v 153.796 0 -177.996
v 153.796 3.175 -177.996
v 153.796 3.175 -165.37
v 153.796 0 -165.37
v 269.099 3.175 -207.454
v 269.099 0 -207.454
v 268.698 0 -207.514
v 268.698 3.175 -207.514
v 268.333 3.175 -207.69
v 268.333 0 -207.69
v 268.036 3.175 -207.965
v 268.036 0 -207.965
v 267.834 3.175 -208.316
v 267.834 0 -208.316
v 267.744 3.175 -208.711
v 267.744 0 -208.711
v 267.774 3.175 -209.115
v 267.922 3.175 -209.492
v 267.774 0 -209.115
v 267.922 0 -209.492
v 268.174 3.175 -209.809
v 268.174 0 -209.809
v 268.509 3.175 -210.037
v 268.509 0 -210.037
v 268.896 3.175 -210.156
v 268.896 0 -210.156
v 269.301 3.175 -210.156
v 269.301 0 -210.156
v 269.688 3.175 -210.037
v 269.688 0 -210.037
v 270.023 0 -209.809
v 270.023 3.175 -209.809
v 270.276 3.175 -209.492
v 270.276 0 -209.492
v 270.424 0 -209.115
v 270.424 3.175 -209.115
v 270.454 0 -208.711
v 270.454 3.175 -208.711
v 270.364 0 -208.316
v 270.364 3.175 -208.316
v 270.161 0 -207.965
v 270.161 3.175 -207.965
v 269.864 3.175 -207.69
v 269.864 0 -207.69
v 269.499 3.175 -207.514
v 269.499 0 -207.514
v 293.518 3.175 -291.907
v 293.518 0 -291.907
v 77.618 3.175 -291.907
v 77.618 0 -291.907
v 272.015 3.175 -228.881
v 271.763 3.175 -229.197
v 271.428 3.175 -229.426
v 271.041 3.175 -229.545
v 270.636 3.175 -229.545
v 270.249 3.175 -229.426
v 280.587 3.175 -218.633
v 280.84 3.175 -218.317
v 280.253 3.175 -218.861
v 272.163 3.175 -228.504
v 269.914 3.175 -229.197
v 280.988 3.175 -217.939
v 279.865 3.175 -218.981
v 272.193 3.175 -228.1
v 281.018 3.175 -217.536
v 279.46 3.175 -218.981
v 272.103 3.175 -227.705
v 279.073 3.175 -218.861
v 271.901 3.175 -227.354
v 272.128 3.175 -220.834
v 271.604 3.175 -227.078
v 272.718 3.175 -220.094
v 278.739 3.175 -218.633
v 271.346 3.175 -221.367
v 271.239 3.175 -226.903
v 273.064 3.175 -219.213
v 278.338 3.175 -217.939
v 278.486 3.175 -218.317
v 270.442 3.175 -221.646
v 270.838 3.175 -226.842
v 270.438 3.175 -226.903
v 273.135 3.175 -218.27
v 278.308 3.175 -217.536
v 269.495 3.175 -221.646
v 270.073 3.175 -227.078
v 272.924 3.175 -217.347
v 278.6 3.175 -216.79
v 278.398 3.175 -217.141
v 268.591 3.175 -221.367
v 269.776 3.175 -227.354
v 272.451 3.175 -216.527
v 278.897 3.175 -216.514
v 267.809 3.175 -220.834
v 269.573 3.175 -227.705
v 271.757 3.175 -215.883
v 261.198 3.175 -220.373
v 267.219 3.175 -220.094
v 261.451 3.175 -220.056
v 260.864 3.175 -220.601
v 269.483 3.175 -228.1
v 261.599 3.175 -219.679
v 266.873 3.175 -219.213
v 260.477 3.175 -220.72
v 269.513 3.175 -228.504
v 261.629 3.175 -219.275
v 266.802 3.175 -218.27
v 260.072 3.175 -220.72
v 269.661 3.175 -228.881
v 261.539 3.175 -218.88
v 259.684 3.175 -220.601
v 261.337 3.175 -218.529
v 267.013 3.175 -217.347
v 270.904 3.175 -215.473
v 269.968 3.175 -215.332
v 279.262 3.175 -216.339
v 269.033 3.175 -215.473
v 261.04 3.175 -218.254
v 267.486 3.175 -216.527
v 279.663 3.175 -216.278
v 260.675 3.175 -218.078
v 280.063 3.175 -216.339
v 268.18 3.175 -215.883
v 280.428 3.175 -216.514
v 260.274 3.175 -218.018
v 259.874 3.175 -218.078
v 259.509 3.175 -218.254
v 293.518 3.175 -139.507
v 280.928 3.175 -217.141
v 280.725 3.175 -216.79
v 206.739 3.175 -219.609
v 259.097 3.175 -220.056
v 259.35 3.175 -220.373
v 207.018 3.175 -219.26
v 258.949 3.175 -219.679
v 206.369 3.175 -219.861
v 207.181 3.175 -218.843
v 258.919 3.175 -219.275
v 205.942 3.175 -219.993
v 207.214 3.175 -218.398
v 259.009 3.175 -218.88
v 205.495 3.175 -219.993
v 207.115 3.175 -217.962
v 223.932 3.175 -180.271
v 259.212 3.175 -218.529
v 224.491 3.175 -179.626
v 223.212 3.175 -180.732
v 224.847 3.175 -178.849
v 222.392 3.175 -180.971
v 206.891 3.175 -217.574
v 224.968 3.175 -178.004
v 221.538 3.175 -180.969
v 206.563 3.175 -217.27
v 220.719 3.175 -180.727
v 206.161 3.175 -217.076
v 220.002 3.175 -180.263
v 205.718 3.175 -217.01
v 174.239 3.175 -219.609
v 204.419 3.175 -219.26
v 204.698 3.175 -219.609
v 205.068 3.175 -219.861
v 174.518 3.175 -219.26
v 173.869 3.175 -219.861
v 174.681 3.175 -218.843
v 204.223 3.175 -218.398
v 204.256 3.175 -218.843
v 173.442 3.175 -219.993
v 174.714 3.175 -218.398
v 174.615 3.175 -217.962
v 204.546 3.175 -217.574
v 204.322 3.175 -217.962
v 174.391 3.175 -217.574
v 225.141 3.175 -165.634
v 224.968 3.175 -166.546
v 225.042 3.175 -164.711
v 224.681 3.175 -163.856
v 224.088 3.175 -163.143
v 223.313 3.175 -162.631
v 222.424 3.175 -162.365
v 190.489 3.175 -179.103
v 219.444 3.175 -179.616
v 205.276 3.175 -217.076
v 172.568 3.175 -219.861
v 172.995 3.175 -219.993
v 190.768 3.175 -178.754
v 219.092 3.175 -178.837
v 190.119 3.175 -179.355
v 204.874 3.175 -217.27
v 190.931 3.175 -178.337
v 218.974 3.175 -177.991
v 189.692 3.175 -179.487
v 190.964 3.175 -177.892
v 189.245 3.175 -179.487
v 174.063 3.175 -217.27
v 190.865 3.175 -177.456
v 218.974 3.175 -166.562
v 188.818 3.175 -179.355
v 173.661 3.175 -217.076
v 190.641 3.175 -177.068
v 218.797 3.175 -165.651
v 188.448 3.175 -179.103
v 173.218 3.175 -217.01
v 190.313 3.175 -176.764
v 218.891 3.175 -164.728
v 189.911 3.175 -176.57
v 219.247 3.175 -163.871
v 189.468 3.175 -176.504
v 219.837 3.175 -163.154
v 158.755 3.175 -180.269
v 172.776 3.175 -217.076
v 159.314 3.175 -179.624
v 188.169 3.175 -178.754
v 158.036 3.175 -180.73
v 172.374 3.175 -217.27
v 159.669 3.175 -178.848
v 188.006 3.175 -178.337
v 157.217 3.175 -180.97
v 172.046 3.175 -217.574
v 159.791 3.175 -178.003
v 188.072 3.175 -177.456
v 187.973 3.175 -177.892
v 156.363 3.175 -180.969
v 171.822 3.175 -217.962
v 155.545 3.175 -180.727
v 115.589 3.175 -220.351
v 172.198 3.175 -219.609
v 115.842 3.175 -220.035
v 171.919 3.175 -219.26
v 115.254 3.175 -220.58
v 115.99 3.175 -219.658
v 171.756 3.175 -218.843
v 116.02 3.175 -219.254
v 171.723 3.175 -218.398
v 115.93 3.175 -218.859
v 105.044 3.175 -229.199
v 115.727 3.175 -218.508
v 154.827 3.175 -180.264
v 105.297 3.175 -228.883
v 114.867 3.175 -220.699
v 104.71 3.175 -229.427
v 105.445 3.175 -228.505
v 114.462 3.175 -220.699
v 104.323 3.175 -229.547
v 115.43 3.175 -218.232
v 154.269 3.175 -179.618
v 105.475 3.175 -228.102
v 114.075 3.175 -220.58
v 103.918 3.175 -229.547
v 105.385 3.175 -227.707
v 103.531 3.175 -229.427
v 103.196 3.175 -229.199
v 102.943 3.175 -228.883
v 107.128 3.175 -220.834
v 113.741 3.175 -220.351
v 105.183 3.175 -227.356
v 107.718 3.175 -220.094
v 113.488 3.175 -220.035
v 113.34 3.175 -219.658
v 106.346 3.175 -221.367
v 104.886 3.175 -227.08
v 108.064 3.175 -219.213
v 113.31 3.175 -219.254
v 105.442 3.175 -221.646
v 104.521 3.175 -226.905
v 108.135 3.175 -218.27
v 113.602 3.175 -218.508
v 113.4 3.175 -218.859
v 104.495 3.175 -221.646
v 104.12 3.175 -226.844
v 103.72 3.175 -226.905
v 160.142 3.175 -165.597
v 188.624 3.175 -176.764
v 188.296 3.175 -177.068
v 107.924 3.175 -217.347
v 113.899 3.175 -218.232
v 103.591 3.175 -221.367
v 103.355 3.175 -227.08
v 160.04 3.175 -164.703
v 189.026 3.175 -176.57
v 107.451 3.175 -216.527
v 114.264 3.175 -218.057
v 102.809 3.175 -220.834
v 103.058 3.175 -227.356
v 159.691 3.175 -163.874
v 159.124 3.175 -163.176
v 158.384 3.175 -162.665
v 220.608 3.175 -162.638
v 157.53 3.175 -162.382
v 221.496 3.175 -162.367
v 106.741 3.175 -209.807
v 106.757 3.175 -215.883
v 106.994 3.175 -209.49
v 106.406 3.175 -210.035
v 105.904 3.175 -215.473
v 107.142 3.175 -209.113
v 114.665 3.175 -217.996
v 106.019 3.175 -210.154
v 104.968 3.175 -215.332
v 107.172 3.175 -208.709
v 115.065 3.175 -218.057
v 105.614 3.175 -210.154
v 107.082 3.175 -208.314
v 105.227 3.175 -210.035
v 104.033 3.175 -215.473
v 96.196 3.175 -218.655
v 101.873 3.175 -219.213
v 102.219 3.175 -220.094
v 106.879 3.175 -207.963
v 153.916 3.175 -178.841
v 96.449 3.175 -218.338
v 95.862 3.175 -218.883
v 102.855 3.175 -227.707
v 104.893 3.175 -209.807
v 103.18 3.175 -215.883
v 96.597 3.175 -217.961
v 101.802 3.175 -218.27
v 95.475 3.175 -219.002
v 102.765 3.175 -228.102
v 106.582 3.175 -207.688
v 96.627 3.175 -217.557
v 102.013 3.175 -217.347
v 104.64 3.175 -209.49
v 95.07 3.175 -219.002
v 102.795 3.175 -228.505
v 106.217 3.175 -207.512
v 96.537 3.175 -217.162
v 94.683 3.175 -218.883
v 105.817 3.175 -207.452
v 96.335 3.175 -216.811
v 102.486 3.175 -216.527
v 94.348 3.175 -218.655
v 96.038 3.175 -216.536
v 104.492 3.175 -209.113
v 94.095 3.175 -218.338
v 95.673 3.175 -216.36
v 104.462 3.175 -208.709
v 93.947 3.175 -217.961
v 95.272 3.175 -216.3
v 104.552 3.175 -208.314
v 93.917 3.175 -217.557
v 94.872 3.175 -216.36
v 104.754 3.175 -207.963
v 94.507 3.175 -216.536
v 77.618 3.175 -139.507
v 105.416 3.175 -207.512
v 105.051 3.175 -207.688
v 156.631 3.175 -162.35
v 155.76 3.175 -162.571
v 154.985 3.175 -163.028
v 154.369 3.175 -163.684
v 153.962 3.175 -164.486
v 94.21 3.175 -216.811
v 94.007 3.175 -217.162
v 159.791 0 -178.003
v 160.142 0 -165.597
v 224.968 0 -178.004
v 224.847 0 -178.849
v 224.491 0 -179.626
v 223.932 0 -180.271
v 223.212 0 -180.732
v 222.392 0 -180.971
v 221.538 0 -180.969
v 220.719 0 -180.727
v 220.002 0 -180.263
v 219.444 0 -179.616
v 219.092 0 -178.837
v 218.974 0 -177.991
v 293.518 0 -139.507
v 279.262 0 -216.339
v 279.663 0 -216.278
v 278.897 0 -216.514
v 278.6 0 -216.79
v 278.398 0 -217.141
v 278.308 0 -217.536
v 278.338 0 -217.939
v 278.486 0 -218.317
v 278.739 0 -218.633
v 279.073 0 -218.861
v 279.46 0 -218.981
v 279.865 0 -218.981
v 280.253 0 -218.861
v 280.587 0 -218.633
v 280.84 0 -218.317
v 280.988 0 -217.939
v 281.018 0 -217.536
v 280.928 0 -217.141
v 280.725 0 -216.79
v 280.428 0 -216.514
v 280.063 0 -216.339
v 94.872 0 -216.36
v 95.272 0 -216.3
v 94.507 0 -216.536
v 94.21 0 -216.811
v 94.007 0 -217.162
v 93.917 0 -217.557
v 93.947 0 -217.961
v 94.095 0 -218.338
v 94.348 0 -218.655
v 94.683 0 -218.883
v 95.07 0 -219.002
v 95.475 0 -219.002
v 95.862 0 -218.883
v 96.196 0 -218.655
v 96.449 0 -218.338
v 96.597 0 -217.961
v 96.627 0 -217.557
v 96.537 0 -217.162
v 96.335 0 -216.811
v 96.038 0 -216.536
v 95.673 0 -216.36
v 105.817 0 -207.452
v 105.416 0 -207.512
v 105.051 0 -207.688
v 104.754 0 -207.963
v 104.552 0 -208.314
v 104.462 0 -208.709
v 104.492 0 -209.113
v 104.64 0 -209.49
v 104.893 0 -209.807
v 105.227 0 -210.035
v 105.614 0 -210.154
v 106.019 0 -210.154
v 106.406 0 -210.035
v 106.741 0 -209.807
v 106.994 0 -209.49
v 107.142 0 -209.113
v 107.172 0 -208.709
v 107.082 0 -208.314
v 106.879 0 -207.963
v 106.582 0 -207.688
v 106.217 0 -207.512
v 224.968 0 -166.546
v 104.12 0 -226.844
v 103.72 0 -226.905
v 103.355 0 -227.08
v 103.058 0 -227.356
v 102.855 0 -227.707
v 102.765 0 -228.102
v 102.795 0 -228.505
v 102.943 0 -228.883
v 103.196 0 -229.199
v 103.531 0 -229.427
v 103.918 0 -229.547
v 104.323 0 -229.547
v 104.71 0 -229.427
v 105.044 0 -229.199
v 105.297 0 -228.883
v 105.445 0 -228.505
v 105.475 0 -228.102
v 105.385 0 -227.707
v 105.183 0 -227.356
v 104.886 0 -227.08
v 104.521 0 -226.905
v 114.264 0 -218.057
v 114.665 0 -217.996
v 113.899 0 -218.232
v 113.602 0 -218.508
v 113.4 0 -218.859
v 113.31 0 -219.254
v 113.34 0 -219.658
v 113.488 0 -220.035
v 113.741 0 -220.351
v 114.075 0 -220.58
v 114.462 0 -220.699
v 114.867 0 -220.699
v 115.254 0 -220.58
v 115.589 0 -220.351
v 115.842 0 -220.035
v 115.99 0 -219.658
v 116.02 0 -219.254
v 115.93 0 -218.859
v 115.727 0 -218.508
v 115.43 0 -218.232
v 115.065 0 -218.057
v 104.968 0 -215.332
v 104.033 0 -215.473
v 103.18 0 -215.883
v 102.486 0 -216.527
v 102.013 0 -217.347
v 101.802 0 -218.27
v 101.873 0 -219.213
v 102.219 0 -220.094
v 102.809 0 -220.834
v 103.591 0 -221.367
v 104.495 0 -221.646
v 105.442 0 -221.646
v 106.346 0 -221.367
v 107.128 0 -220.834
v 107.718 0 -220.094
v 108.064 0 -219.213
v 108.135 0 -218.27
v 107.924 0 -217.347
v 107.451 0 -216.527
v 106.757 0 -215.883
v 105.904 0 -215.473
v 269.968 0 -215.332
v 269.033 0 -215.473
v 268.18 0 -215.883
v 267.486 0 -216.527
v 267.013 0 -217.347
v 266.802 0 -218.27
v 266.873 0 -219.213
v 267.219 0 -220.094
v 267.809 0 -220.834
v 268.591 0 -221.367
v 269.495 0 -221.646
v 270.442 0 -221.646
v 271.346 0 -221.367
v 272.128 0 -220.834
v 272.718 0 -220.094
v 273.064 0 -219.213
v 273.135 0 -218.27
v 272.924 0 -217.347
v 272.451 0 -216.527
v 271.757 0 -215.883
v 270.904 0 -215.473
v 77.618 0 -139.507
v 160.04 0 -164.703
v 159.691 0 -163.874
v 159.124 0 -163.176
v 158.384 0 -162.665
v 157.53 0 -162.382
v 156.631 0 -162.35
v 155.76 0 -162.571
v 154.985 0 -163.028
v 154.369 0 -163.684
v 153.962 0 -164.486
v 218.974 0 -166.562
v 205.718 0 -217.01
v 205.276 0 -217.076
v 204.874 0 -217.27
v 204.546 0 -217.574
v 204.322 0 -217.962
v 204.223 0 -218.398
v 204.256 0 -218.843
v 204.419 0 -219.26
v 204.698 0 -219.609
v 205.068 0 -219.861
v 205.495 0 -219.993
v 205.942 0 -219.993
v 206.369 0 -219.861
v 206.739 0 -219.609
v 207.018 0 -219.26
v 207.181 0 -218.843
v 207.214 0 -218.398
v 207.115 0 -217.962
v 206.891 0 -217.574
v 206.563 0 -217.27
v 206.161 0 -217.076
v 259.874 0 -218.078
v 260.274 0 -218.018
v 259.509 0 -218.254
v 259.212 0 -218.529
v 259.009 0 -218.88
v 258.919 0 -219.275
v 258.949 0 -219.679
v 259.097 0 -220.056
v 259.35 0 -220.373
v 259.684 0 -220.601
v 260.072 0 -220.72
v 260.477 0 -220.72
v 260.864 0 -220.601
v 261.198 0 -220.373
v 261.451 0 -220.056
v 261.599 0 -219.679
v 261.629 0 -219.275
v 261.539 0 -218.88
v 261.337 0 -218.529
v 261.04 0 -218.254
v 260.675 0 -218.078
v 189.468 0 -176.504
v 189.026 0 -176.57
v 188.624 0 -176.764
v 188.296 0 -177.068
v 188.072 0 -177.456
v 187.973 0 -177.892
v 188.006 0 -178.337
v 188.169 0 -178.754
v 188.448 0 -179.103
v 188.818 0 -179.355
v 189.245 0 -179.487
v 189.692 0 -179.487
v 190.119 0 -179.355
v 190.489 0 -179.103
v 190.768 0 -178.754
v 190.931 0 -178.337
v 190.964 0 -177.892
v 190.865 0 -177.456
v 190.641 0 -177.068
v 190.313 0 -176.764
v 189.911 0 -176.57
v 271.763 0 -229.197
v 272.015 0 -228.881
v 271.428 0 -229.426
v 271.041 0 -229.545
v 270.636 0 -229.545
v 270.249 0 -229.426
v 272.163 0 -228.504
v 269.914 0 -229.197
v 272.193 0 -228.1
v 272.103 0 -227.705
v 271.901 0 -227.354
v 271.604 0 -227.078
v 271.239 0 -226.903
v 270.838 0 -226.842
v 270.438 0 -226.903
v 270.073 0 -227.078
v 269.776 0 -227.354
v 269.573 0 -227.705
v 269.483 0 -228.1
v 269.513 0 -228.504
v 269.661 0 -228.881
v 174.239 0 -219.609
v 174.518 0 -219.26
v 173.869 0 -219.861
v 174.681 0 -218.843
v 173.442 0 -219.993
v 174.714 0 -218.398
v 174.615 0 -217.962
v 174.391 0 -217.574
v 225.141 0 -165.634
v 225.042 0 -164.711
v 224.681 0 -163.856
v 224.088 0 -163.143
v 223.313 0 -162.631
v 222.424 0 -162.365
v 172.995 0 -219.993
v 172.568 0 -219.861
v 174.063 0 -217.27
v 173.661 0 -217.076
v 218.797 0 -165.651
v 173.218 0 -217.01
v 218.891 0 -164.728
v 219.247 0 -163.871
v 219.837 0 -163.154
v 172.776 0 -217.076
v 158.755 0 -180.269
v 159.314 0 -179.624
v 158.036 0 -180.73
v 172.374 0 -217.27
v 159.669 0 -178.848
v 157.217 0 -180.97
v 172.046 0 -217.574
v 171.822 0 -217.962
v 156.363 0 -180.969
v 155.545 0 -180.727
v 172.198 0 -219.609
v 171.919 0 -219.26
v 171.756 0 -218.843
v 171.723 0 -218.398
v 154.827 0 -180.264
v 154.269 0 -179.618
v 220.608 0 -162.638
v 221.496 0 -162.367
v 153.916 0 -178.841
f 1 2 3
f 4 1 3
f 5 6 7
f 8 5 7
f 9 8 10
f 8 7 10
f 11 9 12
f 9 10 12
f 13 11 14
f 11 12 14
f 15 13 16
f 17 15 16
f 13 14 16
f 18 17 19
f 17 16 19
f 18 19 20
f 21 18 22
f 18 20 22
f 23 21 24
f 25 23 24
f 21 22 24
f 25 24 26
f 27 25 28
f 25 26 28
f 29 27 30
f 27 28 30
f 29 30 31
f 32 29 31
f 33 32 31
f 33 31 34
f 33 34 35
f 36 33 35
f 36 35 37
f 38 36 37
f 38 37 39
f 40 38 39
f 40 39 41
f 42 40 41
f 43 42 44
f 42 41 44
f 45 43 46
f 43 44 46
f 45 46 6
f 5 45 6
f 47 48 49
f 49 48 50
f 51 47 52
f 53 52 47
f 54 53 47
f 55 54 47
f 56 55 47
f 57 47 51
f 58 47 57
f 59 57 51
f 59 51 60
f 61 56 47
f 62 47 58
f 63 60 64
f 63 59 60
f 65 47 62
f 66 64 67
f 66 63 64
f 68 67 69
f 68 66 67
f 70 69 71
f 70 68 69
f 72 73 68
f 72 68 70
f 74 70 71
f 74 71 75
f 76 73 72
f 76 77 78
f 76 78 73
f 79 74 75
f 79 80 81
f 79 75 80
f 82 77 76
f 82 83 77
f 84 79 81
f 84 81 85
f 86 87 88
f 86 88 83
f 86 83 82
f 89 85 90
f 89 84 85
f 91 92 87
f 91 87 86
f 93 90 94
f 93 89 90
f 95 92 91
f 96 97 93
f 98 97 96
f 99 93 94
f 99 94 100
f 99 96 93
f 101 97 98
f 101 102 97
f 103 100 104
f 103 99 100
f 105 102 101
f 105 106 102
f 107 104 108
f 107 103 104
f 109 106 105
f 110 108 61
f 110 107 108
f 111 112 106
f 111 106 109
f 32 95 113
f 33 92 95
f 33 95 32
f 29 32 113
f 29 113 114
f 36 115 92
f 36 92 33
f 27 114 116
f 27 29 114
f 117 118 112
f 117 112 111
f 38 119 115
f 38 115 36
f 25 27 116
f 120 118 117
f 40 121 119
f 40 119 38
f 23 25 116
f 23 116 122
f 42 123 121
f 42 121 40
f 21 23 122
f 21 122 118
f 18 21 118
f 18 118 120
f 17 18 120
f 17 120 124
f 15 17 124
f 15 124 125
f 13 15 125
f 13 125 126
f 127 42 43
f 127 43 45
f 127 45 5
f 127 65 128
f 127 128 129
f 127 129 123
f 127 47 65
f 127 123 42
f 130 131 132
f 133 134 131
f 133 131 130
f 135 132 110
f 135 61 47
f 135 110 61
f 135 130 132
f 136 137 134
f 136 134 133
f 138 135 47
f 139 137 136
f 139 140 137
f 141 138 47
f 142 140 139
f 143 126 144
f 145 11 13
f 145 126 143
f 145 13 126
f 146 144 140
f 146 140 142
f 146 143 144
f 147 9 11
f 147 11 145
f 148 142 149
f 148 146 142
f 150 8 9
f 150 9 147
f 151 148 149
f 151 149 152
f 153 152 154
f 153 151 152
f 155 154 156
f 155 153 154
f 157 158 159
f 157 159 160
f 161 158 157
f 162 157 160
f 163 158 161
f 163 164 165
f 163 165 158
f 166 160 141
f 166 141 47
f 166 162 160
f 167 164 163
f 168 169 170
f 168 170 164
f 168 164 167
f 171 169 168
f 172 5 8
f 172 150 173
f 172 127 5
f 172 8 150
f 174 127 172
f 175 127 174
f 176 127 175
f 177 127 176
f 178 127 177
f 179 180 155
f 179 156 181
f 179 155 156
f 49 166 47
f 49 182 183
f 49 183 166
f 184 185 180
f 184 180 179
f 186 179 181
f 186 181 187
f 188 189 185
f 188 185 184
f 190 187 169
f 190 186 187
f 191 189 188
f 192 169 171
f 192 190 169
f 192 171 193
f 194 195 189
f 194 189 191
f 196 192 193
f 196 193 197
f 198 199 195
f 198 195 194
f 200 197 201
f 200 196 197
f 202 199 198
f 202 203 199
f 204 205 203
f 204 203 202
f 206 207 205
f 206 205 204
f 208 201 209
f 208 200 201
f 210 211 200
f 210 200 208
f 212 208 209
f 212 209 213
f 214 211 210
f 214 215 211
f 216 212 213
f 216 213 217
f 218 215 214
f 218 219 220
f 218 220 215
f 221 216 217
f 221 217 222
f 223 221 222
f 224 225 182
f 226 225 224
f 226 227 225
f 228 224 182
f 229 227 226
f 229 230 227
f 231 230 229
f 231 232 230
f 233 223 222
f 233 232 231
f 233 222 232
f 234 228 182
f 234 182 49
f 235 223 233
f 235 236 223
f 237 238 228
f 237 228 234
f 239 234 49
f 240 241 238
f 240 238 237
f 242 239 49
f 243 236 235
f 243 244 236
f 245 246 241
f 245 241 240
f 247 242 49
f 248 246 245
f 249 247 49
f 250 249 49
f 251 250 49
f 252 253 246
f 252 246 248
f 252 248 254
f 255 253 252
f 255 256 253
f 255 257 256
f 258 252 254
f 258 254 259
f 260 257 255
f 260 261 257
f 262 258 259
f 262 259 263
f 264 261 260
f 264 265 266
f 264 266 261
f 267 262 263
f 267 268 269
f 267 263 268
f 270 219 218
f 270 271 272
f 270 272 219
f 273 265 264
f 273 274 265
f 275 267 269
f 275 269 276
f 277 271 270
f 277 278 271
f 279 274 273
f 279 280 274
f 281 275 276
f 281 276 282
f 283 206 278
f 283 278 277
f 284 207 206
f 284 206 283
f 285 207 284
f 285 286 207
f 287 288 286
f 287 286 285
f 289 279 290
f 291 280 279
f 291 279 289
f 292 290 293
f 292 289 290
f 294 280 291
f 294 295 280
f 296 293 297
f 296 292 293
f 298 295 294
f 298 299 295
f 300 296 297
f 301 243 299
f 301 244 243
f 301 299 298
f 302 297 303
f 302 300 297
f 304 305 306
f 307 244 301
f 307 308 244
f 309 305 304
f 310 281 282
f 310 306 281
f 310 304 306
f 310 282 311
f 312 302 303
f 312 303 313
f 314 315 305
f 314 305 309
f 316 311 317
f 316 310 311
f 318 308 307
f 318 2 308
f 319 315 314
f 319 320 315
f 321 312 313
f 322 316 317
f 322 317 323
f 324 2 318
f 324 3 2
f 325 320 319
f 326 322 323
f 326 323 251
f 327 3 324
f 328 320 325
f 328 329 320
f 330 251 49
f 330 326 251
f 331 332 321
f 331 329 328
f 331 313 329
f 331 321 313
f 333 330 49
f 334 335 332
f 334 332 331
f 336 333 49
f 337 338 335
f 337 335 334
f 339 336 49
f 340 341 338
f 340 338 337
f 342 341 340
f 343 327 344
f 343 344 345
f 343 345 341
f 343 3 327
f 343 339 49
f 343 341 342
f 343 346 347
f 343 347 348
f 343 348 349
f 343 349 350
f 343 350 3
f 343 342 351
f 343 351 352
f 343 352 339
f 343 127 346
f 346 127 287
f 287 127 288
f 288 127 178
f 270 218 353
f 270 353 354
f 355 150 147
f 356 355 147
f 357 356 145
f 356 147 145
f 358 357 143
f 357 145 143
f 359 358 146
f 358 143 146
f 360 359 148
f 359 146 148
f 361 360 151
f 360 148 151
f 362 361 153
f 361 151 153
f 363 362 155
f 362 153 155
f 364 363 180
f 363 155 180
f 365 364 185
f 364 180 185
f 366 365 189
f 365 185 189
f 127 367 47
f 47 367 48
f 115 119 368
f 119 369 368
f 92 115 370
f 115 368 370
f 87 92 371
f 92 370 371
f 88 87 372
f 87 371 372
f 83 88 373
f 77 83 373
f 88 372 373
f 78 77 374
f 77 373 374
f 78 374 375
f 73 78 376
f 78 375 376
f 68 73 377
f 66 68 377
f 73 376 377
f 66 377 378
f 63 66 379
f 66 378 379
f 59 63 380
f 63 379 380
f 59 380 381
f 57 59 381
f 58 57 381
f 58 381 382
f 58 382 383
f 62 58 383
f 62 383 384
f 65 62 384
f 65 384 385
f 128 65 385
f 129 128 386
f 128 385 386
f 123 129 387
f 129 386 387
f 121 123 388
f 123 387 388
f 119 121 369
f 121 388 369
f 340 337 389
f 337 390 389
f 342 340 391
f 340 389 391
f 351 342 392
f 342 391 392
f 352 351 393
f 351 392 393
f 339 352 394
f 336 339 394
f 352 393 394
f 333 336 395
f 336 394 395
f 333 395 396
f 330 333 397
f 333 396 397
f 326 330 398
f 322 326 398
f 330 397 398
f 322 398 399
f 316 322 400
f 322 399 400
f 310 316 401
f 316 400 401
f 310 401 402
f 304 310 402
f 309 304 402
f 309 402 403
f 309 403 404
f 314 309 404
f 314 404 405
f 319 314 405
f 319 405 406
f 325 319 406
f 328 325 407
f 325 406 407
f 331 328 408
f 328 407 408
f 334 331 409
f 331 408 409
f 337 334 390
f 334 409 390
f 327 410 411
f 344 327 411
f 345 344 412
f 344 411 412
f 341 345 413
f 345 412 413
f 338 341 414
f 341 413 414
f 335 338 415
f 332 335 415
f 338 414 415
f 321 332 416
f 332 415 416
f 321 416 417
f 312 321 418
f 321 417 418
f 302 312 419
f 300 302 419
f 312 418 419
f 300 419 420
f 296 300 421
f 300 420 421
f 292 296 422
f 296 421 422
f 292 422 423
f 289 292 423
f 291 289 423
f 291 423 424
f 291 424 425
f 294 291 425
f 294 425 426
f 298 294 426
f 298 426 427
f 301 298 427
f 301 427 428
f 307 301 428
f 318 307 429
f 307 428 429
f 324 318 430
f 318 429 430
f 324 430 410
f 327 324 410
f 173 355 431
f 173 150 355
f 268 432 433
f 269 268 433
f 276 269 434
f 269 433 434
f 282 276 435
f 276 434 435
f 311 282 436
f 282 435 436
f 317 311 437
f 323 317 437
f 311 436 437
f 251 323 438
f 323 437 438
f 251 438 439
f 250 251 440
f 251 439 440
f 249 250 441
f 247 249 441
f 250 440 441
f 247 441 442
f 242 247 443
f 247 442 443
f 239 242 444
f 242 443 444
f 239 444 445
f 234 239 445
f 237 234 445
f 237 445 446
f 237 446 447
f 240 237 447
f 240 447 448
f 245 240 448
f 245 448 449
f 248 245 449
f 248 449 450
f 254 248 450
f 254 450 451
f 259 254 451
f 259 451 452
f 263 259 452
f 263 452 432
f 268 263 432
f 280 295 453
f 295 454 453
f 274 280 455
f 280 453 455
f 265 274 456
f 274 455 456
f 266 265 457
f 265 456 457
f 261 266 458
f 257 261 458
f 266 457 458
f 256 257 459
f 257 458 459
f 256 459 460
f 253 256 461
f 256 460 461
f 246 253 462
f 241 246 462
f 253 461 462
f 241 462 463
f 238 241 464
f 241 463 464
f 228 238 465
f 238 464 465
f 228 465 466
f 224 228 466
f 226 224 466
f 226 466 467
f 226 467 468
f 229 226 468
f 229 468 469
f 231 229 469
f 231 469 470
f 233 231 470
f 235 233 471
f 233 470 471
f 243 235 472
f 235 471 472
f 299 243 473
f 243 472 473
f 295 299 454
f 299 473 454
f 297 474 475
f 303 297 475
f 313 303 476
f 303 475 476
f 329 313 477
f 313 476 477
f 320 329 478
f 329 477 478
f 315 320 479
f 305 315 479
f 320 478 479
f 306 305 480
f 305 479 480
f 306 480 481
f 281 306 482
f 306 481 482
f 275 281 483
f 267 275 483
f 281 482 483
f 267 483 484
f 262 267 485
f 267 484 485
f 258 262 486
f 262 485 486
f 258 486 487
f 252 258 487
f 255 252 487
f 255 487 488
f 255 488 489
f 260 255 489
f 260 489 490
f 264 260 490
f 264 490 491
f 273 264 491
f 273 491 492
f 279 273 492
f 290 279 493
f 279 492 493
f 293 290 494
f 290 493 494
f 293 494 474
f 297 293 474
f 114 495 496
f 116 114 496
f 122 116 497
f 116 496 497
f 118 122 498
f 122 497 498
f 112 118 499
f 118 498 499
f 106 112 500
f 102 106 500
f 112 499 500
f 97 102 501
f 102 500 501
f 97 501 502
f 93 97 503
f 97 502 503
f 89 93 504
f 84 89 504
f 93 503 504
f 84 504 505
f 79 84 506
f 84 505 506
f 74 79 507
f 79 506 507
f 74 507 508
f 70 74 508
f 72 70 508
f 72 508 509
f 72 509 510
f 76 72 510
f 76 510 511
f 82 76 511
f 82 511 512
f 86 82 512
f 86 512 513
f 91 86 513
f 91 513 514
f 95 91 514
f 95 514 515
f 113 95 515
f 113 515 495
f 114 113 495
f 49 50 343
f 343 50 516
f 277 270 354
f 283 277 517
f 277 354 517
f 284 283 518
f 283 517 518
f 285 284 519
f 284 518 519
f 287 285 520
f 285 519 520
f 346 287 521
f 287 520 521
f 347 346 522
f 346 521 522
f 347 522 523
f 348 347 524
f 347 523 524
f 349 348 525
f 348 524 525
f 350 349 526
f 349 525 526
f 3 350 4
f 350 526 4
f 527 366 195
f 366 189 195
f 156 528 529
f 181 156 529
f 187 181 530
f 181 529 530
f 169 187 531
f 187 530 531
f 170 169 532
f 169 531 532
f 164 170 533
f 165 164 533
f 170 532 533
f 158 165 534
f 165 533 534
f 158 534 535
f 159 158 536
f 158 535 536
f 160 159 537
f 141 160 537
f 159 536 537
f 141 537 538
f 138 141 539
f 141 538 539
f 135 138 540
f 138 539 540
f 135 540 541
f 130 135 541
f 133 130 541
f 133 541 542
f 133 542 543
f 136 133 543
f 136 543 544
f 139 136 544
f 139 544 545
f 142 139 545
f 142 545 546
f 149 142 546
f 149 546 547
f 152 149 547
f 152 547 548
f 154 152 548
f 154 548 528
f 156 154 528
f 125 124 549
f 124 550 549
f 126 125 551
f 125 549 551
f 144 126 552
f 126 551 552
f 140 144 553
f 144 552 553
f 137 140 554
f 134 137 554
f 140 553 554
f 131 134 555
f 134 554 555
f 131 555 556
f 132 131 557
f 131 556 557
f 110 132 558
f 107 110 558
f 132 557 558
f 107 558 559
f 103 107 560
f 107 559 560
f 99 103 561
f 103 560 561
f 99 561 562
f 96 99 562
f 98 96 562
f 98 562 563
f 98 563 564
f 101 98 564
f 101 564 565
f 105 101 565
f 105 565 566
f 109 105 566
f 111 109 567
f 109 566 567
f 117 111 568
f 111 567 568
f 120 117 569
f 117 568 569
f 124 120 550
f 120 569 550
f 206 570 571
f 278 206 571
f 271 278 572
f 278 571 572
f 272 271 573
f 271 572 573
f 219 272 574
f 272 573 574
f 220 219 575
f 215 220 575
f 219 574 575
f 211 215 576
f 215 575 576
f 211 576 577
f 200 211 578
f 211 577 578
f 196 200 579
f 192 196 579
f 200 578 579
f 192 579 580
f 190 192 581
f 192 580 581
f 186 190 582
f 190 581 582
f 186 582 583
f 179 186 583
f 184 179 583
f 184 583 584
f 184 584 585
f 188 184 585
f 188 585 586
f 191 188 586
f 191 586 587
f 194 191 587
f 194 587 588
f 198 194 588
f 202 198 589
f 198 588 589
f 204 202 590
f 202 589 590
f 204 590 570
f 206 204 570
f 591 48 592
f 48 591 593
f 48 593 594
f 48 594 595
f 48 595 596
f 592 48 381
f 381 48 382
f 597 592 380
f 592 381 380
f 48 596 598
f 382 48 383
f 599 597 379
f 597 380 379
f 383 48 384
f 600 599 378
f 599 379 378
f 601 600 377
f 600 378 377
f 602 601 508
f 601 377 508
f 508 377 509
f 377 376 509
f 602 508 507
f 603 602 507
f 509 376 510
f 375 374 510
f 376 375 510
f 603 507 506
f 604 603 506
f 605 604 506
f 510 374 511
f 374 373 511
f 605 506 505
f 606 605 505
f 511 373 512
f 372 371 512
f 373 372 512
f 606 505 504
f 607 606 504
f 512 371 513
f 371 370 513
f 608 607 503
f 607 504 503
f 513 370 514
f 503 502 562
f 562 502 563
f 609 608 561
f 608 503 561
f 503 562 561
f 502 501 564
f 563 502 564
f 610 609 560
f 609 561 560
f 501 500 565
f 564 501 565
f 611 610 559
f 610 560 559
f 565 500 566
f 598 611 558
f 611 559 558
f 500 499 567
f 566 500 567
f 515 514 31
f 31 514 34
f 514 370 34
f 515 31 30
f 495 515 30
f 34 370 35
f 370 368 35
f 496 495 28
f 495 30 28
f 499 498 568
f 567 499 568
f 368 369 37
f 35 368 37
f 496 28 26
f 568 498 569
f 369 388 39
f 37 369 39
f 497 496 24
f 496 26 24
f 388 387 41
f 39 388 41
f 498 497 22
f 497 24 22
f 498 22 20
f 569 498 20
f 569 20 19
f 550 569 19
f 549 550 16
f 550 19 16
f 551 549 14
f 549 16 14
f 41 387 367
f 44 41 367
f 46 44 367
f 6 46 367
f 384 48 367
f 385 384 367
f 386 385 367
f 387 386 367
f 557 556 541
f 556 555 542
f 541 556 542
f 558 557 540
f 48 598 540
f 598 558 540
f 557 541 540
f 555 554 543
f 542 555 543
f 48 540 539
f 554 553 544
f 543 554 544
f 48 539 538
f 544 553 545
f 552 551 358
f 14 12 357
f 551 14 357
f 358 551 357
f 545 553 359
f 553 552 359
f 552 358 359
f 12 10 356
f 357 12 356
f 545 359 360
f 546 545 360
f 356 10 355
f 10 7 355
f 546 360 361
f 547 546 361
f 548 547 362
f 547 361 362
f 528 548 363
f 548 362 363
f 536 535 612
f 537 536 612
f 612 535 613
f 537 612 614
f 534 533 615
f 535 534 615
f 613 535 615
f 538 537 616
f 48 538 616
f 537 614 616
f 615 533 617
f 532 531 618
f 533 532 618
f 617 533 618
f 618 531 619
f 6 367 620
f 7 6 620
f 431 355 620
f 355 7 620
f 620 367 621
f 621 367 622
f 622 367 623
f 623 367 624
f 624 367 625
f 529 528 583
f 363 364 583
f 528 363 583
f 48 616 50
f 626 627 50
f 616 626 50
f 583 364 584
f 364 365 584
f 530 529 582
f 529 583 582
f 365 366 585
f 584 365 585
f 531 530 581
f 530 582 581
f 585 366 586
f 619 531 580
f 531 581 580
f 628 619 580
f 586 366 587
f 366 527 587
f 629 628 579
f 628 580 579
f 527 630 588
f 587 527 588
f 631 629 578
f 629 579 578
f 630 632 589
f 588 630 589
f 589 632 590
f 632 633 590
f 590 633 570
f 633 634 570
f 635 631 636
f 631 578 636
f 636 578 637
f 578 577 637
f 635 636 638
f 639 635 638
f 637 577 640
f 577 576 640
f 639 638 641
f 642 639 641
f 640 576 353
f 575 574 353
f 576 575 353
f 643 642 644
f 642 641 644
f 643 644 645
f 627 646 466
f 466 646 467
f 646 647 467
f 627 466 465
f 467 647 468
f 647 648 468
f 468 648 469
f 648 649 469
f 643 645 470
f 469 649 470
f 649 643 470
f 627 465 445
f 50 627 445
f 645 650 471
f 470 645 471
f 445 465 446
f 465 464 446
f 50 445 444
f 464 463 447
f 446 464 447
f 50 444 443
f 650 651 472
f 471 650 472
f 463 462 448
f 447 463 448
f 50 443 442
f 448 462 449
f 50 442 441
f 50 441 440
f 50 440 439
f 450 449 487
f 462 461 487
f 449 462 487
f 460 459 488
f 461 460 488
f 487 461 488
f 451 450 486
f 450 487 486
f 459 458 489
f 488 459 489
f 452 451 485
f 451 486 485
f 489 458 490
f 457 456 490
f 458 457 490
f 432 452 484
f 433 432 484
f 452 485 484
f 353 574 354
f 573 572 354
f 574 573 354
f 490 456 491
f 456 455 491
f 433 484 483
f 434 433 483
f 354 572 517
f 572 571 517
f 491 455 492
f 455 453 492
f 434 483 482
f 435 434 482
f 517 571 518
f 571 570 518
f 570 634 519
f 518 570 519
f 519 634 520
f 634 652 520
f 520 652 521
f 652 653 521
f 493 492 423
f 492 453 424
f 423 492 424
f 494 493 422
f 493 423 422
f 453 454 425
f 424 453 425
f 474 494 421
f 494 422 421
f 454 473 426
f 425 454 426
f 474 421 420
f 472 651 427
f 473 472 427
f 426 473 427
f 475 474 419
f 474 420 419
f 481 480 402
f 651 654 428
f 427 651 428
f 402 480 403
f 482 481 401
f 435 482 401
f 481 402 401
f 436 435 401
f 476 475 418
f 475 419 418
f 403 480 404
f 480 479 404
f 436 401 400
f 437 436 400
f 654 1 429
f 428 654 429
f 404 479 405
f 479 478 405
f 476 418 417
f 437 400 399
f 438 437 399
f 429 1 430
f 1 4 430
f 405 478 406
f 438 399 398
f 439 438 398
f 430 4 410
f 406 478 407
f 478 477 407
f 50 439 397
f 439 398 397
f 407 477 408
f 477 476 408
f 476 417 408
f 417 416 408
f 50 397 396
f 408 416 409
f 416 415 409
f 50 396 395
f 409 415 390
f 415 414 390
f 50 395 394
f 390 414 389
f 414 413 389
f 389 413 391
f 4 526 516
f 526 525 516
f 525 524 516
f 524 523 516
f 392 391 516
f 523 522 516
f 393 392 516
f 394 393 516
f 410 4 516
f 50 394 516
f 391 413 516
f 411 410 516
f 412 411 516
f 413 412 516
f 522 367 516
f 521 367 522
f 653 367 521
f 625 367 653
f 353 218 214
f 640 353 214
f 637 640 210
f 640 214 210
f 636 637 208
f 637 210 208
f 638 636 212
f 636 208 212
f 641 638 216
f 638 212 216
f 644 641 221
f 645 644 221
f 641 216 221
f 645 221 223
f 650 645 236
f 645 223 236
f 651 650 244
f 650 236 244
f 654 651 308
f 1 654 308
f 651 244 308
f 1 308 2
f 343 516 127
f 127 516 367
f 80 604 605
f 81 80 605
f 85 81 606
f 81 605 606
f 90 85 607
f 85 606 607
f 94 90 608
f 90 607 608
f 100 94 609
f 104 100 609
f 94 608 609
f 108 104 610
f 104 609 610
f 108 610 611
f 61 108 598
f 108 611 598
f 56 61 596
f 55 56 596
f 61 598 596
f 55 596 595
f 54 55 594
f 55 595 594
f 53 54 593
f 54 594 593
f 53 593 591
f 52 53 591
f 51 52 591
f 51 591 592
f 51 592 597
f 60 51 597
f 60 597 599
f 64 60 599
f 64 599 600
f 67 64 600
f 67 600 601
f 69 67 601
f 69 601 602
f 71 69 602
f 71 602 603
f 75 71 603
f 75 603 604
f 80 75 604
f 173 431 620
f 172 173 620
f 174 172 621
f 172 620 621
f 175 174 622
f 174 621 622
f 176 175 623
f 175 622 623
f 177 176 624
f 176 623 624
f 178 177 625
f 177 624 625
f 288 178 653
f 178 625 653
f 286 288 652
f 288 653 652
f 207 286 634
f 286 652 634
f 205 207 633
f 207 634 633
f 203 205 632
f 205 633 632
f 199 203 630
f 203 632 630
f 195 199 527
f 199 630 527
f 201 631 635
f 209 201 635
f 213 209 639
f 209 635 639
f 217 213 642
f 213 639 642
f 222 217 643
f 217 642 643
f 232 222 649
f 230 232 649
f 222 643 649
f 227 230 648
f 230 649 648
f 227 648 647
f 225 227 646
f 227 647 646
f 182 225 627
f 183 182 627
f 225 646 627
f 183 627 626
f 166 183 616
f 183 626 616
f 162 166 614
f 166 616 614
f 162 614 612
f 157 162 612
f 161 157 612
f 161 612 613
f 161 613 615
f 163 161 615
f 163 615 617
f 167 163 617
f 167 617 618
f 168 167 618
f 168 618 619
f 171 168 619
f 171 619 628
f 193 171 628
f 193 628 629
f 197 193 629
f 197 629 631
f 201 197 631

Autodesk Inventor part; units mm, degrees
ref_plane "YZ Plane" through (0, 0, 0) normal (1, 0, 0) x (0, 1, 0)
ref_plane "XZ Plane" through (0, 0, 0) normal (0, 1, 0) x (-1, 0, 0)
ref_plane "XY Plane" through (0, 0, 0) normal (0, 0, 1) x (1, 0, 0)
sketch "Sketch1" plane through (0, 0, 0) normal (0, 1, 0) x (-1, 0, 0)
  line L0 (-77.6185, -139.5068) -> (-293.5185, -139.5068)
  line L1 (-293.5185, -139.5068) -> (-293.5185, -291.9068)
  line L2 (-293.5185, -291.9068) -> (-77.6185, -291.9068)
  line L3 (-77.6185, -291.9068) -> (-77.6185, -139.5068)
  point P0 (0, 0)
  dimension "d0" = 215.9
  dimension "d1" = 152.4
extrude "Extrusion1" add sketch "Sketch1" along normal blind 3.175
sketch "Sketch2" plane through (0, 3.175, 0) normal (0, 1, 0) x (1, 0, 0)
  line L0 (77.6185, 291.9068) -> (77.6185, 139.5068) projected
  line L1 (77.6185, 139.5068) -> (293.5185, 139.5068) projected
  line L2 (293.5185, 139.5068) -> (293.5185, 291.9068) projected
  line L3 (293.5185, 291.9068) -> (77.6185, 291.9068) projected
  line L4 (185.5685, 291.9068) -> (185.5685, 139.5068)
  line L5 (104.9685, 218.5068) -> (221.9685, 218.5068) construction
  line L6 (156.9685, 165.5068) -> (156.9685, 258.7711) construction
  point P0 (0, 0)
  point P1 (269.9685, 218.5068)
  point P2 (221.9685, 165.5068)
  dimension "d4" = 144.35
  dimension "d5" = 26
  dimension "d7" = 79
  dimension "d19" = 27.35
  dimension "d20" = 79
  dimension "d21" = 26
  dimension "d22" = 79.35
  dimension "d23" = 192.35
  dimension "d180" = 65
  dimension "d201" = 36.4
  dimension "d202" = 28.6
hole "Hole1" at (156.9685, 3.175, -165.5068) at (104.9685, 3.175, -218.5068) at (269.9685, 3.175, -218.5068) at (221.9685, 3.175, -165.5068) direction (0, -1, 0) diameter 6.35 end through all
sketch "Sketch3" plane through (0, 3.175, 0) normal (0, 1, 0) x (1, 0, 0)
  circle A0 centre (104.9685, 218.5068) radius 3.175 projected
  circle A1 centre (269.9685, 218.5068) radius 3.175 projected
  circle A2 centre (221.9685, 165.5068) radius 3.175 projected
  circle A3 centre (156.9685, 165.5068) radius 3.175 projected
  line L0 (293.5185, 139.5068) -> (293.5185, 291.9068) projected
  line L1 (77.6185, 139.5068) -> (293.5185, 139.5068) projected
  line L2 (104.9685, 218.5068) -> (156.9685, 165.5068) construction
  line L3 (78.5272, 236.3897) -> (154.4976, 158.9583)
  line L4 (185.5685, 291.9068) -> (185.5685, 139.5068) construction
  line L5 (185.5685, 158.0068) -> (156.7639, 158.0068)
  line L6 (80.7935, 282.3818) -> (185.5685, 282.3818)
  line L7 (77.6185, 279.2068) -> (77.6185, 238.6132)
  arc A4 (80.7935, 282.3818) -> (77.6185, 279.2068) centre (80.7935, 279.2068) ccw
  arc A5 (77.6185, 238.6132) -> (78.5272, 236.3897) centre (80.7935, 238.6132) ccw
  arc A6 (154.4976, 158.9583) -> (156.7639, 158.0068) centre (156.7639, 161.1818) ccw
  circle A7 centre (266.1685, 218.5068) radius 3.175
  circle A8 centre (214.1685, 165.5068) radius 3.175
  line L8 (266.1685, 218.5068) -> (214.1685, 165.5068) construction
  line L9 (292.6098, 236.3897) -> (216.6394, 158.9583)
  line L10 (185.5685, 158.0068) -> (214.3731, 158.0068)
  line L11 (290.3435, 282.3818) -> (185.5685, 282.3818)
  line L12 (293.5185, 279.2068) -> (293.5185, 238.6132)
  arc A9 (293.5185, 279.2068) -> (290.3435, 282.3818) centre (290.3435, 279.2068) ccw
  arc A10 (292.6098, 236.3897) -> (293.5185, 238.6132) centre (290.3435, 238.6132) ccw
  arc A11 (214.3731, 158.0068) -> (216.6394, 158.9583) centre (214.3731, 161.1818) ccw
  point P0 (0, 0)
  point P1 (77.6185, 237.3158)
  point P2 (77.6185, 282.3818)
  point P3 (293.5185, 237.3158)
  point P4 (293.5185, 282.3818)
  dimension "d192" = 6.35
  dimension "d193" = 7.5
  dimension "d197" = 3.175
  dimension "d198" = 3.175
extrude "Extrusion3" [suppressed]
sketch "Sketch7" plane through (0, 3.175, 0) normal (0, 1, 0) x (1, 0, 0)
  circle A0 centre (156.9685, 165.5068) radius 3.175 projected
  line L0 (155.9994, 158.0068) -> (221.9685, 158.0068) projected
  circle A1 centre (156.7936, 178.0024) radius 2.9972
  line L1 (153.7965, 177.9961) -> (153.7965, 165.3697)
  line L2 (159.7908, 178.0031) -> (160.1422, 165.5967)
  circle A2 centre (222.1463, 178.0024) radius 2.9972
  circle A3 centre (221.9685, 165.5068) radius 3.175 projected
  line L3 (219.1491, 178.0147) -> (219.1491, 164.0468)
  line L4 (225.1435, 178.0036) -> (225.1435, 165.5068)
  point P0 (0, 0)
  point P1 (218.7935, 165.5083)
  dimension "d76" = 5.9944
  dimension "d77" = 12.4968
  dimension "d78" = 5.9944
  dimension "d79" = 12.4968
  dimension "d88" = 6.35
extrude "Extrusion4" cut sketch "Sketch7" against normal blind 25.4 contours A0 L1 A1 L2 | A1
sketch "Sketch8" plane through (0, 3.175, 0) normal (0, 1, 0) x (1, 0, 0)
  arc A0 (224.9685, 178.0036) -> (218.9741, 177.9913) centre (221.9713, 178.0036) ccw
  circle A1 centre (221.9685, 165.5068) radius 3
  line L0 (218.9741, 178.016) -> (218.9741, 165.3232)
  line L1 (224.9685, 178.0036) -> (224.9685, 165.5068)
  point P0 (0, 0)
  point P1 (218.9685, 165.5082)
  dimension "d82" = 5.9944
  dimension "d83" = 12.4968
extrude "Extrusion5" cut sketch "Sketch8" against normal blind 25.4 contours L1 A1 L0 A0 | A1 L0 picked at (221.9464, 164.5591)
sketch "Sketch5" plane through (0, 3.175, 0) normal (0, 1, 0) x (1, 0, 0)
  circle A0 centre (104.9685, 218.5068) radius 3.175 projected
  circle A1 centre (104.9685, 218.5068) radius 22.225
  circle A2 centre (156.9685, 165.5068) radius 3.175 projected
  circle A3 centre (156.9685, 165.5068) radius 22.225
  circle A4 centre (221.9685, 165.5068) radius 3.175 projected
  circle A5 centre (221.9685, 165.5068) radius 22.225
  circle A6 centre (269.9685, 218.5068) radius 3.175 projected
  circle A7 centre (269.9685, 218.5068) radius 22.225
  line L0 (155.9994, 158.0068) -> (221.9685, 158.0068) projected
  arc A8 (224.9685, 178.0036) -> (218.9741, 178.016) centre (221.9713, 178.0036) ccw projected
  line L1 (287.1685, 282.4291) -> (83.9685, 282.4291) projected
  point P0 (0, 0)
  point P1 (205.7185, 218.5096)
  point P2 (189.4685, 178.0036)
  point P3 (173.2185, 218.5096)
  dimension "d45" = 44.45
  dimension "d47" = 44.45
  dimension "d48" = 44.45
  dimension "d49" = 44.45
  dimension "d50" = 60.5028
  dimension "d52" = 65
  dimension "d53" = 16.25
  dimension "d54" = 16.25
  dimension "d55" = 60.5028
  dimension "d58" = 52
  dimension "d62" = 32.5
  dimension "d125" = 0
  dimension "d181" = 32.5
  dimension "d186" = 63.9194
hole "Hole2" at (205.7185, 3.175, -218.5096) at (189.4685, 3.175, -178.0036) at (173.2185, 3.175, -218.5096) direction (0, -1, 0) diameter 3 end through all
sketch "Sketch11" plane through (0, 3.175, 0) normal (0, 1, 0) x (1, 0, 0)
  circle A0 centre (104.9685, 218.5068) radius 3.175 projected
  circle A1 centre (104.9685, 218.5068) radius 9.7333
  line L0 (95.2722, 217.6585) -> (104.1202, 228.2031) construction
  line L1 (79.8868, 220.4869) -> (153.2717, 158.9097) construction
  circle A2 centre (269.9685, 218.5068) radius 9.7333
  line L2 (269.0987, 208.8124) -> (279.6629, 217.6371) construction
  line L3 (227.8466, 160.8487) -> (291.2394, 213.8031) construction
  point P0 (105.8168, 208.8105)
  point P1 (114.6648, 219.3552)
  point P2 (270.8383, 228.2012)
  point P3 (260.2741, 219.3766)
  dimension "d174" = 19.4667
  dimension "d175" = 19.4667
  dimension "d161" = 360
  dimension "d178" = 360
hole "Hole4" at (95.2722, 3.175, -217.6585) at (105.8168, 3.175, -208.8105) at (114.6648, 3.175, -219.3552) at (104.1202, 3.175, -228.2031) at (260.2741, 3.175, -219.3766) at (270.8383, 3.175, -228.2012) at (279.6629, 3.175, -217.6371) at (269.0987, 3.175, -208.8124) direction (0, -1, 0) diameter 2.7178 end through all
sketch "Sketch15" plane through (0, 3.175, 0) normal (0, 1, 0) x (1, 0, 0)
  circle A0 centre (269.9685, 218.5068) radius 3.175 projected
  arc A1 (218.9741, 166.5625) -> (224.9685, 166.5464) centre (221.9685, 165.5068) ccw projected
  line L0 (226.6751, 161.2442) -> (185.5685, 161.2442)
  line L1 (293.5185, 291.9068) -> (77.6185, 291.9068) projected
  line L2 (185.5685, 282.3818) -> (185.5685, 139.5068)
  line L3 (77.6185, 139.5068) -> (293.5185, 139.5068) projected
  line L4 (226.6751, 161.2442) -> (293.5185, 225.5385)
  line L5 (293.5185, 282.3818) -> (185.5685, 282.3818)
  line L6 (293.5185, 282.3818) -> (293.5185, 225.5385)
  line L7 (293.5185, 139.5068) -> (293.5185, 291.9068) projected
  circle A2 centre (101.1685, 218.5068) radius 3.175
  arc A3 (146.1685, 166.5464) -> (152.1629, 166.5625) centre (149.1685, 165.5068) ccw
  line L8 (144.4618, 161.2442) -> (185.5685, 161.2442)
  line L9 (144.4618, 161.2442) -> (77.6185, 225.5385)
  line L10 (77.6185, 282.3818) -> (185.5685, 282.3818)
  line L11 (77.6185, 282.3818) -> (77.6185, 225.5385)
  point P0 (0, 0)
  dimension "d200" = 9.525
equation "\"d78\" = d76"
equation "\"d79\" = d77"
equation "\"d82\" = d84"
equation "\"d83\" = d85"
equation "\"d47\" = d45"
equation "\"d48\" = d45"
equation "\"d49\" = d48"
equation "\"d53\" = 0.25 * d52"
equation "\"d54\" = d53"
equation "\"d55\" = d50"
equation "\"d62\" = 0.5 * d52"
equation "\"d84\" = 5.9944"
equation "\"d85\" = 12.4968"
properties part number "track side panel V1"
